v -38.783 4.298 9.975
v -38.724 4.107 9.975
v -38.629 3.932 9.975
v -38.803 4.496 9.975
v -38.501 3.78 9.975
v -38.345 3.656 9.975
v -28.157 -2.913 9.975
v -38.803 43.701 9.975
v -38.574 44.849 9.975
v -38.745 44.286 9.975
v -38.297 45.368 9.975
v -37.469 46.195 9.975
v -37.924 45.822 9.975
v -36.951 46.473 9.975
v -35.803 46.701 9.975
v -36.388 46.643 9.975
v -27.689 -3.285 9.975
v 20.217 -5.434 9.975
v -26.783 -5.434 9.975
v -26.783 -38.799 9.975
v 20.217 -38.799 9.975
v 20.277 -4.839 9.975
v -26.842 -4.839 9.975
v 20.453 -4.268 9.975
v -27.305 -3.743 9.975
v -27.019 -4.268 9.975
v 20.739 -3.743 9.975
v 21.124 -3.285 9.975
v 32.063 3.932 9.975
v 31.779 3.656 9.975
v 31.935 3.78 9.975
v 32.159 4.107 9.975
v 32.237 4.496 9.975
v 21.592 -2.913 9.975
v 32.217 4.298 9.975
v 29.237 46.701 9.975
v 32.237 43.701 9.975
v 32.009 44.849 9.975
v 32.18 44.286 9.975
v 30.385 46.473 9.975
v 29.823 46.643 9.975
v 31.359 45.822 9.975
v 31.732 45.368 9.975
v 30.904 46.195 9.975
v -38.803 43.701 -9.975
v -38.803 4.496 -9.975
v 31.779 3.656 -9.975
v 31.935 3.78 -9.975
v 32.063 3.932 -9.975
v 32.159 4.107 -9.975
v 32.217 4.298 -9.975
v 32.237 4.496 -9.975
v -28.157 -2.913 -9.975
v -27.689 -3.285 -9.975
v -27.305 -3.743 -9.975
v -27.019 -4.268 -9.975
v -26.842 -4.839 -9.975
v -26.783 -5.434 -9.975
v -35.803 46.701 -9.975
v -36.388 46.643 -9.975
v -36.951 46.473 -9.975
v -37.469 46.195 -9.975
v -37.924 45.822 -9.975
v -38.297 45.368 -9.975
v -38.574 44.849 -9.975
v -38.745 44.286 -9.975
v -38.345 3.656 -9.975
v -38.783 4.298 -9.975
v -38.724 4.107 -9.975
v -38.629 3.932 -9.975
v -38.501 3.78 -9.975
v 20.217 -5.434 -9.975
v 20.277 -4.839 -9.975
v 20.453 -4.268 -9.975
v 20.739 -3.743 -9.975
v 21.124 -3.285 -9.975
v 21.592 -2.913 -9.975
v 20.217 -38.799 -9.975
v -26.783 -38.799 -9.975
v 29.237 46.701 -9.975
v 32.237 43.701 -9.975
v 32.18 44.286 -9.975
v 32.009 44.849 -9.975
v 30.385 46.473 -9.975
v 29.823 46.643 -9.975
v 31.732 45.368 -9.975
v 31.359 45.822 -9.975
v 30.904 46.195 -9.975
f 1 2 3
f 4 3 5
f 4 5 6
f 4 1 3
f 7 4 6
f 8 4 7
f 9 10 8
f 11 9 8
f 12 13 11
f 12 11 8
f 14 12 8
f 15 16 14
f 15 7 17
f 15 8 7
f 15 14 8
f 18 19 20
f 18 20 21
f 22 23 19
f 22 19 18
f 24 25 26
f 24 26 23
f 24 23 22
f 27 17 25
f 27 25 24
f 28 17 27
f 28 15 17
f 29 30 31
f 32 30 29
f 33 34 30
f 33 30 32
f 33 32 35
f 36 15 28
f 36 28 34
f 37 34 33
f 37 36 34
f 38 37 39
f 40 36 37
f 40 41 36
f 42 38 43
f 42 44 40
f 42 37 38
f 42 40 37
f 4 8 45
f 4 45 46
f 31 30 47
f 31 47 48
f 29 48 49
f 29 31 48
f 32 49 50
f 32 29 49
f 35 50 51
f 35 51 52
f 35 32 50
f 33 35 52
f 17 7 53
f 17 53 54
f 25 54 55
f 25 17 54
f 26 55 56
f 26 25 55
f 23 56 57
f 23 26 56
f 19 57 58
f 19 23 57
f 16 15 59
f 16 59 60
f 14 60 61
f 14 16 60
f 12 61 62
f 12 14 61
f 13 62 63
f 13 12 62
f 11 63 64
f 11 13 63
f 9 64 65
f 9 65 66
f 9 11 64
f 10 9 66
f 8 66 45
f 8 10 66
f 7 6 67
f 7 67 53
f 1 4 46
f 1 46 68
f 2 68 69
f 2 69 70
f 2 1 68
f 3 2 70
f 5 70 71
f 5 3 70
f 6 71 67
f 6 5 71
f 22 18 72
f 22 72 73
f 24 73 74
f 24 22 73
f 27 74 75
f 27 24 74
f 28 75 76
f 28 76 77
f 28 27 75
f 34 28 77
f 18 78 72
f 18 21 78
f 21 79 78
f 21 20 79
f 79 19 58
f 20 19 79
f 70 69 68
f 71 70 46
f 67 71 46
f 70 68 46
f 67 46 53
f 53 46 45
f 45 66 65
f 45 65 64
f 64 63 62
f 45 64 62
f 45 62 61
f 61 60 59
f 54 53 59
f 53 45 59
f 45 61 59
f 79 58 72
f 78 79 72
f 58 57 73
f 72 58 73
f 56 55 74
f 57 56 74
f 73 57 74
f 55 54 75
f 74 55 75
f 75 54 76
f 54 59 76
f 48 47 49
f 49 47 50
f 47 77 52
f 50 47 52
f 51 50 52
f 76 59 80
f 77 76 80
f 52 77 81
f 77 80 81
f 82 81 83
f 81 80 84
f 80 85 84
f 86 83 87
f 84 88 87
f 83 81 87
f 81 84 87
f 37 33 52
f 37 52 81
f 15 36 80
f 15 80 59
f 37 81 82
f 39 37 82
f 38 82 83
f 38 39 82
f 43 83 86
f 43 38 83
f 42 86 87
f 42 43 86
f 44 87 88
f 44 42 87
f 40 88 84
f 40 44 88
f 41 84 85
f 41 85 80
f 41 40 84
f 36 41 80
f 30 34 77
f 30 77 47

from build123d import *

# Parameters (mm, degrees)
BOSS_EXTRUDE1_DEPTH = 9.975


with BuildPart() as part:
    # Sketch1 → Boss-Extrude1 (new, symmetric)
    with BuildSketch(Plane.XY):
        with BuildLine():
            Line((20.217281255, -38.799092726), (20.217281255, -5.434329714))
            ThreePointArc((20.217281255, -5.434329714), (20.583178789, -3.998535787), (21.591617389, -2.912977499))
            Line((21.591617389, -2.912977499), (31.77916921, 3.655535531))
            ThreePointArc((31.77916921, 3.655535531), (32.11531541, 4.017388294), (32.237281255, 4.495986269))
            Line((32.237281255, 4.495986269), (32.237281255, 43.700907274))
            ThreePointArc((32.237281255, 43.700907274), (31.358601598, 45.822227617), (29.237281255, 46.700907274))
            Line((29.237281255, 46.700907274), (-35.802718745, 46.700907274))
            ThreePointArc((-35.802718745, 46.700907274), (-37.924039089, 45.822227617), (-38.802718745, 43.700907274))
            Line((-38.802718745, 43.700907274), (-38.802718745, 4.495986269))
            ThreePointArc((-38.802718745, 4.495986269), (-38.6807529, 4.017388294), (-38.344606701, 3.655535531))
            Line((-38.344606701, 3.655535531), (-28.157054879, -2.912977499))
            ThreePointArc((-28.157054879, -2.912977499), (-27.14861628, -3.998535787), (-26.782718745, -5.434329714))
            Line((-26.782718745, -5.434329714), (-26.782718745, -38.799092726))
            Line((-26.782718745, -38.799092726), (20.217281255, -38.799092726))
        make_face()
    extrude(amount=BOSS_EXTRUDE1_DEPTH, both=True)


solid = part.part
